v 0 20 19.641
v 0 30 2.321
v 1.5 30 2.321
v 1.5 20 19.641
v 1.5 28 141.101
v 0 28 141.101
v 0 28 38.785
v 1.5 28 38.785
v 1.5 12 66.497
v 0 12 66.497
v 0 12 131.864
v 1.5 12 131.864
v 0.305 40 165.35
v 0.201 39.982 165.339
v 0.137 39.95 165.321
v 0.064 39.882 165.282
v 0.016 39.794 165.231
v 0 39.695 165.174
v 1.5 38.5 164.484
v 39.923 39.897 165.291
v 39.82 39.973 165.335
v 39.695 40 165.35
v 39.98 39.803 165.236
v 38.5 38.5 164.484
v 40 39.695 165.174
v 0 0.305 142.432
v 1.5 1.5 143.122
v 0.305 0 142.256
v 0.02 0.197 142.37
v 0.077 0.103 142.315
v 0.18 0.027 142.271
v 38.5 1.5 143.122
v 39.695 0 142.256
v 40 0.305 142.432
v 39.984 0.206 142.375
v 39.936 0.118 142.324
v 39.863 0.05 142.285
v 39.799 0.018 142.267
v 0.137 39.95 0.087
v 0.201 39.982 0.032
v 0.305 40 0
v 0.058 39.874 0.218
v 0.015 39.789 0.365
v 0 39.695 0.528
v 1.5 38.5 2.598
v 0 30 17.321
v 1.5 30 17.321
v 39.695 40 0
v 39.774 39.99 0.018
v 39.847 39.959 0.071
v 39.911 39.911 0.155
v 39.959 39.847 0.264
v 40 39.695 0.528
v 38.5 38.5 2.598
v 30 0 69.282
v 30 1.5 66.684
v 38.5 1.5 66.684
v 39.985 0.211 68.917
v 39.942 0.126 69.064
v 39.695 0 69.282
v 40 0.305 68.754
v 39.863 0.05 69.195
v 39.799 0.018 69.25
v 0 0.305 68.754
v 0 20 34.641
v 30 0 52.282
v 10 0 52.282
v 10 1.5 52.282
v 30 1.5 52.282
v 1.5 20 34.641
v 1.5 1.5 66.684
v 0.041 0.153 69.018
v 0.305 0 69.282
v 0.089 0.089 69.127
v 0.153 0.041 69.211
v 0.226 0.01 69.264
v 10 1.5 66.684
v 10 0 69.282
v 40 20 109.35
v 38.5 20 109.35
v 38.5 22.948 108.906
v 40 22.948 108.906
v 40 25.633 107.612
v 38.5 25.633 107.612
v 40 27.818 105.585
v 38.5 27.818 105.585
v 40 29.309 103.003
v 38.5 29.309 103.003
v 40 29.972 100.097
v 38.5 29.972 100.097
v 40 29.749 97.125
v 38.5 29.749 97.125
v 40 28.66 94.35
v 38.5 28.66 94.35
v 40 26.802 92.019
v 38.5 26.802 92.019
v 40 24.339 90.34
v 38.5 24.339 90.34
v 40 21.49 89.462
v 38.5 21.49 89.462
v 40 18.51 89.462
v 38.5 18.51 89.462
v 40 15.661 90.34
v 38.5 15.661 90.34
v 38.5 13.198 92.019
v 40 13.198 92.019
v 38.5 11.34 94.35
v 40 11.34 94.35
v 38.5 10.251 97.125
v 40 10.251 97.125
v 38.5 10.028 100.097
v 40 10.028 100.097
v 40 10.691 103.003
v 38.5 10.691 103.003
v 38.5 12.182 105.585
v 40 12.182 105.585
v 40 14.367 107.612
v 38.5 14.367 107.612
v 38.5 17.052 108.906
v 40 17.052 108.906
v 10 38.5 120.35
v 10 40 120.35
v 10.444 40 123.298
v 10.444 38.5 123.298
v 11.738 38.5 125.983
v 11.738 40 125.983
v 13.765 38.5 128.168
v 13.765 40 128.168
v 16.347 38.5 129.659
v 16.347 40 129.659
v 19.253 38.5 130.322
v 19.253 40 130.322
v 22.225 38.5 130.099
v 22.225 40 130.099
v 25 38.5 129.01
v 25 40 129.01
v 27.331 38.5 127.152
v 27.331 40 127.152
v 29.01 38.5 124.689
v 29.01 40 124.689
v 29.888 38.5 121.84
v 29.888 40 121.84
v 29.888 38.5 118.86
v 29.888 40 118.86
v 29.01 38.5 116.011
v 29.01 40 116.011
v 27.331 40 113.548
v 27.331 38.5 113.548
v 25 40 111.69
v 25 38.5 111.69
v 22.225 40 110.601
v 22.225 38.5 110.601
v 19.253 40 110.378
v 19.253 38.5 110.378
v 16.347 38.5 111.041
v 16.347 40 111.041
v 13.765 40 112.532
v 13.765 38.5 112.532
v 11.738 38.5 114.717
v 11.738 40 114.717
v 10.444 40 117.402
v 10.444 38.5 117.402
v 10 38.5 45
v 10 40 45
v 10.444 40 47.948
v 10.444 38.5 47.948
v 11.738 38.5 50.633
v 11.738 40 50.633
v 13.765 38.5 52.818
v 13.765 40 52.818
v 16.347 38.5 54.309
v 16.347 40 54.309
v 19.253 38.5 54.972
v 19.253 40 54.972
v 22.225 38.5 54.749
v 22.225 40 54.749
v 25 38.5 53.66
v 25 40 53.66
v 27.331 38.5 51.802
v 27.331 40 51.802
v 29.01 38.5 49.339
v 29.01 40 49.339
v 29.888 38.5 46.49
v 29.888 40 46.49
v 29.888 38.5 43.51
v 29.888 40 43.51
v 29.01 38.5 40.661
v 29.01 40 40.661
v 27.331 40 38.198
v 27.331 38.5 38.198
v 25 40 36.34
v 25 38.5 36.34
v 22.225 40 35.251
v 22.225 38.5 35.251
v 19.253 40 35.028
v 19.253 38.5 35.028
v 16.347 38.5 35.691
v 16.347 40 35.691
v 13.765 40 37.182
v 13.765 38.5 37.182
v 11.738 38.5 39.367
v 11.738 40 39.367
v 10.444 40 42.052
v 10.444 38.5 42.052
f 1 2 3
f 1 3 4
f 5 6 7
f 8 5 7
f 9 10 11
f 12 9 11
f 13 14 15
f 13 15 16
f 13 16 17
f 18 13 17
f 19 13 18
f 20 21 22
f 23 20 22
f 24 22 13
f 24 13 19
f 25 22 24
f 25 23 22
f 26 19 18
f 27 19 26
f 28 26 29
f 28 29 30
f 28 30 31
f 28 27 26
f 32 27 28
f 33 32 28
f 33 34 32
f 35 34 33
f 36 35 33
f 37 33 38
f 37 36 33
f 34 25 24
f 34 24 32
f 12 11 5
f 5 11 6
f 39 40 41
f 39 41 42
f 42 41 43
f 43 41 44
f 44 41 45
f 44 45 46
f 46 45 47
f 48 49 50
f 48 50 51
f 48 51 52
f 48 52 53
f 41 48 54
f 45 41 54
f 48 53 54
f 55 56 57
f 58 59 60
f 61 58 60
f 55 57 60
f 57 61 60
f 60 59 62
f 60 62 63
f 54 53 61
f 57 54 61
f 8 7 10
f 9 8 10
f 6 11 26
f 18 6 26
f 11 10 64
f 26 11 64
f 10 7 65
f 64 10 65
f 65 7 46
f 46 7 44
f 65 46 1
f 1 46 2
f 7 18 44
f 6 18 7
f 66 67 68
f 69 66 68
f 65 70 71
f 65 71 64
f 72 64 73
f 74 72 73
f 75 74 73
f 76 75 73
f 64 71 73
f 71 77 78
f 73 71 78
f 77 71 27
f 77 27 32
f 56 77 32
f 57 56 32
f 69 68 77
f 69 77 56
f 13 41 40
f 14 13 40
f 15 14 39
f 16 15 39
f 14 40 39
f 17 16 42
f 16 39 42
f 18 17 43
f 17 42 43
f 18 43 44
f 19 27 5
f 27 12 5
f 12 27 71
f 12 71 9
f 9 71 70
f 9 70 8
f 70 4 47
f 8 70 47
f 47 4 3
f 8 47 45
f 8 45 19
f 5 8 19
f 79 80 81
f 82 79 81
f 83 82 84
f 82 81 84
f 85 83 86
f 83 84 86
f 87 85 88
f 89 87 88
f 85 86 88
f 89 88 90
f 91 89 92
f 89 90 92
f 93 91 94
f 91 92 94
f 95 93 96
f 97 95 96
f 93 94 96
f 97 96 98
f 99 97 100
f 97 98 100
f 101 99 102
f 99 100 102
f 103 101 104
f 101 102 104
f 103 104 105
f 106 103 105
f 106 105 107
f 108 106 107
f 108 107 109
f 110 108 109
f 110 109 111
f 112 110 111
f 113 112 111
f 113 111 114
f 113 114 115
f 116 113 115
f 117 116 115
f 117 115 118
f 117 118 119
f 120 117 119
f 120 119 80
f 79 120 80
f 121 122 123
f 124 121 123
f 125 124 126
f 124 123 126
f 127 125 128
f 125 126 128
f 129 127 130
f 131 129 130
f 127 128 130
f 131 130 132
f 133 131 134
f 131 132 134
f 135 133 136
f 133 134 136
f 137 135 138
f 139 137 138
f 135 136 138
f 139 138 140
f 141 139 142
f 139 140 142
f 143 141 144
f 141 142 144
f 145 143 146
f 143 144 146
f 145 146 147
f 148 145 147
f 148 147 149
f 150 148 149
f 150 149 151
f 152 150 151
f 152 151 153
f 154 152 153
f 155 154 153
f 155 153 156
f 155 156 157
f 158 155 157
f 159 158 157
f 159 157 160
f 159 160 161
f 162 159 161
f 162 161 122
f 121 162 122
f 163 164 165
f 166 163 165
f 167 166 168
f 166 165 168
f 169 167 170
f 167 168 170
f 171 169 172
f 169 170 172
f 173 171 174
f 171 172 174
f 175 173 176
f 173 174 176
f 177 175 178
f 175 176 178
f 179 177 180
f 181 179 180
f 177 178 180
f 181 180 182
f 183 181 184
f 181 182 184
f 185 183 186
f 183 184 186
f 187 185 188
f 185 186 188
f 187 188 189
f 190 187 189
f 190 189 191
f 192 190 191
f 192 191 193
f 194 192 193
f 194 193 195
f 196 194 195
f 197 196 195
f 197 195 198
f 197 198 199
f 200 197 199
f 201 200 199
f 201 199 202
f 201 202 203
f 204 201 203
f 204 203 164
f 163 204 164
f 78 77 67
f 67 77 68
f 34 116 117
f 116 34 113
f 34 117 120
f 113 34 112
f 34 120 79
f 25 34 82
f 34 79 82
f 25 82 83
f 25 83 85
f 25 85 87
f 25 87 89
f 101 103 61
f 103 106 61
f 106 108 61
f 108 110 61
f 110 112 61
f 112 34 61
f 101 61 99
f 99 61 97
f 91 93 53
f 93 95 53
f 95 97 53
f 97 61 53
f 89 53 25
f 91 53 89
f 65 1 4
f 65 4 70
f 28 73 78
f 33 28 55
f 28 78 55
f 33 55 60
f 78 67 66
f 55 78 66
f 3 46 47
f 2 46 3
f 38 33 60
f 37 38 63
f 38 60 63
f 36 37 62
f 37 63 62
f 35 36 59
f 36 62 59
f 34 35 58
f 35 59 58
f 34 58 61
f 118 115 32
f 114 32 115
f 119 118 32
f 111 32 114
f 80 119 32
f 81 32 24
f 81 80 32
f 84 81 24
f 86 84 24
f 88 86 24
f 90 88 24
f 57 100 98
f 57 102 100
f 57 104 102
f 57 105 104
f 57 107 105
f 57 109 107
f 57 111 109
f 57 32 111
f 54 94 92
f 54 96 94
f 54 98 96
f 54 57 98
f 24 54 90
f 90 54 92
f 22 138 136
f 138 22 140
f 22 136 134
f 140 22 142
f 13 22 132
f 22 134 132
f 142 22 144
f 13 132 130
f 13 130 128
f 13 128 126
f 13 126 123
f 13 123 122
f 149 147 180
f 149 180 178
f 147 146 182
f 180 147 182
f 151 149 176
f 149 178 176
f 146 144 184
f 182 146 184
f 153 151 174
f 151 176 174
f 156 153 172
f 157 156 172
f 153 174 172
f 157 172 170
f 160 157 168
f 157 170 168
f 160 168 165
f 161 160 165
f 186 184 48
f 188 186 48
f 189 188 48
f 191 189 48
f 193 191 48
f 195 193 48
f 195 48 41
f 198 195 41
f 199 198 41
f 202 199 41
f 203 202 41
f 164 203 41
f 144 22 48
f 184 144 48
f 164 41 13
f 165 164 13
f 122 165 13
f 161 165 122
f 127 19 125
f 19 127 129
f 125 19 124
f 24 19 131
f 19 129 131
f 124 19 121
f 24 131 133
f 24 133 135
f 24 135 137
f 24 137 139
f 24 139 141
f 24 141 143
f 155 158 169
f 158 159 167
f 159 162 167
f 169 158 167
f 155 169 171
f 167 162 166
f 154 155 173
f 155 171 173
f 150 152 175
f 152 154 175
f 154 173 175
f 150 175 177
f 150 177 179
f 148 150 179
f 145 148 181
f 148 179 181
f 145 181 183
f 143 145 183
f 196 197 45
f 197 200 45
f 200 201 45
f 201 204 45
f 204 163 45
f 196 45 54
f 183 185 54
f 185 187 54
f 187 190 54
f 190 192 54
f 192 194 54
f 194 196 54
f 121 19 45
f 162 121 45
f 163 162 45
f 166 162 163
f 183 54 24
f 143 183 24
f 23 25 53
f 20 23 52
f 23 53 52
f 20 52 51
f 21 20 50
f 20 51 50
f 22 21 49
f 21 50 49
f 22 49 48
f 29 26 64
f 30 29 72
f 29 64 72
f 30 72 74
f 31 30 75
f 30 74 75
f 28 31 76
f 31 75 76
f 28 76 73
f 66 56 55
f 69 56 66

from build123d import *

# Parameters (mm, degrees)
SKETCH1_W           = 37
SKETCH1_H           = 37
BOSS_EXTRUDE1_DEPTH = 165.35
CUT_EXTRUDE1_DEPTH  = 50
BOSS_EXTRUDE2_START = -10
BOSS_EXTRUDE2_DEPTH = 20
BOSS_EXTRUDE3_DEPTH = 1.5
CUT_EXTRUDE2_DEPTH  = 10
SKETCH6_R           = 10
CUT_EXTRUDE3_DEPTH  = 10
SKETCH7_R           = 10
CUT_EXTRUDE4_DEPTH  = 10


with BuildPart() as part:
    # Sketch1 → Boss-Extrude1 (new body)
    with BuildSketch(Plane.XY):
        with BuildLine():
            Line((0.305025041, 0), (39.694974959, 0))
            ThreePointArc((39.694974959, 0), (39.910660234, 0.089339766), (40, 0.305025041))
            Line((40, 0.305025041), (40, 39.694974959))
            ThreePointArc((40, 39.694974959), (39.910660234, 39.910660234), (39.694974959, 40))
            Line((39.694974959, 40), (0.305025041, 40))
            ThreePointArc((0.305025041, 40), (0.089339766, 39.910660234), (0, 39.694974959))
            Line((0, 39.694974959), (0, 0.305025041))
            ThreePointArc((0, 0.305025041), (0.089339766, 0.089339766), (0.305025041, 0))
        make_face()
        with Locations((20, 20)):
            Rectangle(SKETCH1_W, SKETCH1_H, mode=Mode.SUBTRACT)
    extrude(amount=BOSS_EXTRUDE1_DEPTH)

    # Sketch2 → Cut-Extrude1 (cut)
    with BuildSketch(Plane(origin=(40, 0, 0), x_dir=(0, 0, -1), z_dir=(1, 0, 0))):
        Polygon((0, 40), (-69.282032303, 0), (0, 0), align=None)
        Polygon((-165.35, 40), (-142.255989232, 0), (-165.35, 0), align=None)
    extrude(amount=-CUT_EXTRUDE1_DEPTH, mode=Mode.SUBTRACT)

    # Sketch3 → Boss-Extrude2 (add)
    with BuildSketch(Plane.ZY.offset(BOSS_EXTRUDE2_START)):
        Polygon((69.282032303, 0), (52.282032303, 0), (52.282032303, 1.5), (66.683956091, 1.5), align=None)
    extrude(amount=-BOSS_EXTRUDE2_DEPTH)

    # Sketch4 → Boss-Extrude3 (add)
    with BuildSketch(Plane.ZY):
        Polygon((2.320508076, 30), (19.641016151, 20), (34.641016151, 20), (17.320508076, 30), align=None)
    extrude(amount=-BOSS_EXTRUDE3_DEPTH)

    # Sketch5 → Cut-Extrude2 (cut)
    with BuildSketch(Plane(origin=(0, 0, 0), x_dir=(0, 0, -1), z_dir=(1, 0, 0))):
        Polygon((-38.784609691, 28), (-66.497422612, 12), (-131.863684387, 12), (-141.101288694, 28), align=None)
    extrude(amount=CUT_EXTRUDE2_DEPTH, mode=Mode.SUBTRACT)

    # Sketch6 → Cut-Extrude3 (cut)
    with BuildSketch(Plane(origin=(0, 40, 0), x_dir=(1, 0, 0), z_dir=(0, 1, 0))):
        with Locations(Location((20, -120.35, 0), (0, 0, 180))):
            Circle(SKETCH6_R)
        with Locations(Location((20, -45, 0), (0, 0, 180))):
            Circle(SKETCH6_R)
    extrude(amount=-CUT_EXTRUDE3_DEPTH, mode=Mode.SUBTRACT)

    # Sketch7 → Cut-Extrude4 (cut)
    with BuildSketch(Plane.ZY.offset(-38.5)):
        with Locations((99.35, 20)):
            Circle(SKETCH7_R)
    extrude(amount=-CUT_EXTRUDE4_DEPTH, mode=Mode.SUBTRACT)


solid = part.part
